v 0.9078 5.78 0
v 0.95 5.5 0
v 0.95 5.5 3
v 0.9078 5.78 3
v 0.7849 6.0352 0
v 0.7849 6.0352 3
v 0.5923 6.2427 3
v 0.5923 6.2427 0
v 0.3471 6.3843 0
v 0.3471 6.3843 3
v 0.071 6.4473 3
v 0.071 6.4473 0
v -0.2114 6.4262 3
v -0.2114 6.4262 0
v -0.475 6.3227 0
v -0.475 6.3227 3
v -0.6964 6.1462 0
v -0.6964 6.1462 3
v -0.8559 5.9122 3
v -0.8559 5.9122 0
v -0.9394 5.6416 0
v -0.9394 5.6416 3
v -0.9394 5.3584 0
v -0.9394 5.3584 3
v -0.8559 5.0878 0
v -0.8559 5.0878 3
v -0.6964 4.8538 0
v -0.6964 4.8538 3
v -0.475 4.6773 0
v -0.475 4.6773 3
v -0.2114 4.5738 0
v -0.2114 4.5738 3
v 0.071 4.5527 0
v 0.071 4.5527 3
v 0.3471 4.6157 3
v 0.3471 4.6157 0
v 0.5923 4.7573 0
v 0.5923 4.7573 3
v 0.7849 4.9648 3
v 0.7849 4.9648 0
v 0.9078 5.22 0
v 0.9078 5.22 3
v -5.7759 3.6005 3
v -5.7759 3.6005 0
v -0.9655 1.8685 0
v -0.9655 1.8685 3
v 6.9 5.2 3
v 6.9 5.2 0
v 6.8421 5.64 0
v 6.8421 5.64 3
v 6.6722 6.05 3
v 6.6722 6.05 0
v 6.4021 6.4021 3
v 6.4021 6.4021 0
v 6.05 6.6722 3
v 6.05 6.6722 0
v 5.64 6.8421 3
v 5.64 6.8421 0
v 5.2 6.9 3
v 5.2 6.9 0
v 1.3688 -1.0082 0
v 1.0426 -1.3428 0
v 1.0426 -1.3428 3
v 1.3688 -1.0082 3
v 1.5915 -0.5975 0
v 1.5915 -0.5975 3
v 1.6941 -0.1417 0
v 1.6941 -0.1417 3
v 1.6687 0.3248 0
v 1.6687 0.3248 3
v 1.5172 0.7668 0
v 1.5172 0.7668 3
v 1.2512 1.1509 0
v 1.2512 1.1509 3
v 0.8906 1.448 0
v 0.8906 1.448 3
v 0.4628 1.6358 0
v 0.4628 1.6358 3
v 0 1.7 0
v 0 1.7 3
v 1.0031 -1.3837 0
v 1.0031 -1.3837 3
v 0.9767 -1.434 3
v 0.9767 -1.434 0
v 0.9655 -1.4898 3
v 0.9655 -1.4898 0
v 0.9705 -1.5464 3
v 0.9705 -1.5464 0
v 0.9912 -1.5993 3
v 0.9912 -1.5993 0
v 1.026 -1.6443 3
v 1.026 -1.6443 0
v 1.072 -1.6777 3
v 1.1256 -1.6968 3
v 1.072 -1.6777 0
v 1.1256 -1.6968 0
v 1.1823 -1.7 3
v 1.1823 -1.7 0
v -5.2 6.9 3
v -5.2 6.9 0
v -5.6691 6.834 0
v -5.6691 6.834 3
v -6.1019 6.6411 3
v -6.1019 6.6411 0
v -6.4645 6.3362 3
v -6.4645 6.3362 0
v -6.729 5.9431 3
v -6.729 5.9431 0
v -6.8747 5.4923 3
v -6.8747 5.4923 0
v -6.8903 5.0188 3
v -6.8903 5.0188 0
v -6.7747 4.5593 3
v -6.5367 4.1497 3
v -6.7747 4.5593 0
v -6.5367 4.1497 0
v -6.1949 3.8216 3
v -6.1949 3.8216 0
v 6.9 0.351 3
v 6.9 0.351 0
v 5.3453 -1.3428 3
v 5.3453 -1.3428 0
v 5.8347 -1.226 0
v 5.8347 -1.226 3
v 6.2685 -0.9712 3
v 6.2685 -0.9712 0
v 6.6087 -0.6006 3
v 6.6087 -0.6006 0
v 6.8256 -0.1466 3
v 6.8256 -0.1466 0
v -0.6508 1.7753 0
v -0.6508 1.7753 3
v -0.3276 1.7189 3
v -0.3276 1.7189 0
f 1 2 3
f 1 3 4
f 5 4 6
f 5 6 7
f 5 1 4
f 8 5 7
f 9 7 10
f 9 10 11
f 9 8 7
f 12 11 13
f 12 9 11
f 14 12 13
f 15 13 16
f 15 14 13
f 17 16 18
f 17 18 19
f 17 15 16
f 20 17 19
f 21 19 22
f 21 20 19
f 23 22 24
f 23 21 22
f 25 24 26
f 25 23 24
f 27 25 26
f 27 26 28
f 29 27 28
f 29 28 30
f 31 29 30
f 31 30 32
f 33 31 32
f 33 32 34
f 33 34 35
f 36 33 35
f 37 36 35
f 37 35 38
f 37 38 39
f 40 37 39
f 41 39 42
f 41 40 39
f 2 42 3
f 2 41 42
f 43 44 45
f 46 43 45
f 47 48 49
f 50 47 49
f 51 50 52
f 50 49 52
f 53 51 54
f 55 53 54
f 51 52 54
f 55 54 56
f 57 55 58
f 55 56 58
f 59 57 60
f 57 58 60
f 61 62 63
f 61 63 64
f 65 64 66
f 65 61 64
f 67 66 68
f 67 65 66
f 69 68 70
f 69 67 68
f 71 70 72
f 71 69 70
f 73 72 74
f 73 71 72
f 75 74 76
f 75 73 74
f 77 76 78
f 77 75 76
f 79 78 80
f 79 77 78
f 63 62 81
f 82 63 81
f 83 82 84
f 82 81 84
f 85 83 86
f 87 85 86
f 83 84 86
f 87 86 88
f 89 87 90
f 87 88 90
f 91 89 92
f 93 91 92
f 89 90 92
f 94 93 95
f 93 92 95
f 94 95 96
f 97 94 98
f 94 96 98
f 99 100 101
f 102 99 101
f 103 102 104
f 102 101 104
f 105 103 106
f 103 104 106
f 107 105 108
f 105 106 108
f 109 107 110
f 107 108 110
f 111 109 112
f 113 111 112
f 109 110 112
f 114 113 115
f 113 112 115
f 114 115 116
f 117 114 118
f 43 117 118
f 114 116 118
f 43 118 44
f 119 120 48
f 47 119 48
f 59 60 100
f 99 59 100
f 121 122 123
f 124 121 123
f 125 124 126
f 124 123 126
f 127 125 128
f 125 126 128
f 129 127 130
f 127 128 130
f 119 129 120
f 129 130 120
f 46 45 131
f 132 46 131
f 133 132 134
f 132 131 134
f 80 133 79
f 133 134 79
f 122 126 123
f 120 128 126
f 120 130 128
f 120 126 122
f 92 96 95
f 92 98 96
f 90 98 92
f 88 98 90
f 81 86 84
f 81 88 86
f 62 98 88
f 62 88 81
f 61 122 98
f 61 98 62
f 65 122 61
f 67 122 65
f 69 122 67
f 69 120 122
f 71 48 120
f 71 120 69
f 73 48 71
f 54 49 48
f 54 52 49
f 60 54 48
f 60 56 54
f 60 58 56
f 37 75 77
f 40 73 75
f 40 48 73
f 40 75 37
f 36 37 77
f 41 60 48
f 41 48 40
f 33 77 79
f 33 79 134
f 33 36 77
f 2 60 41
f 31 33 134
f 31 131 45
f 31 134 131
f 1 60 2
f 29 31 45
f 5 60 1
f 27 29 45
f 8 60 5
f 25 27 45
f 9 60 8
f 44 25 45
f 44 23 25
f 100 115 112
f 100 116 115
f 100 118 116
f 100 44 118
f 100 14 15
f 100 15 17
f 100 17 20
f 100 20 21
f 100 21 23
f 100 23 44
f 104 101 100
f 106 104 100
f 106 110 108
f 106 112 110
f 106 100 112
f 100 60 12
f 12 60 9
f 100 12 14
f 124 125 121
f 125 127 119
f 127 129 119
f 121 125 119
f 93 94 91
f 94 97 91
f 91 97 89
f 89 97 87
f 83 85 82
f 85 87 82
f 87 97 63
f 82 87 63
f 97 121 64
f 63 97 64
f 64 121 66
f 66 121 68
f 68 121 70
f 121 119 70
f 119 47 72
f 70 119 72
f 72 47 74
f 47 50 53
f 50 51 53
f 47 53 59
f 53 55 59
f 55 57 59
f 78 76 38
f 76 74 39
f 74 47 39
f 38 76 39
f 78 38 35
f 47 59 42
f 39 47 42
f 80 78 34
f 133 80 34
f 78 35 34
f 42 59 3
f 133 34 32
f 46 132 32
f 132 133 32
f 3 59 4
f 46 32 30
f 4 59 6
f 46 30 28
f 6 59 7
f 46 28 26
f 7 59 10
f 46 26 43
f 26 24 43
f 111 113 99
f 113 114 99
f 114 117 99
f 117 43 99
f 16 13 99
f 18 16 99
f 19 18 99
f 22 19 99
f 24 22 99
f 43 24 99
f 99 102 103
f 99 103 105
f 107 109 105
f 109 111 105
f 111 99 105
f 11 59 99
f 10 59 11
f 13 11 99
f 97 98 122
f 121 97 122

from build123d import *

# Parameters (mm, degrees)
SKETCH_R  = 0.95
PAD_DEPTH = 3


with BuildPart() as part:
    # Sketch → Pad (new body)
    with BuildSketch(Plane.XY):
        with BuildLine():
            ThreePointArc((1.04259, -1.342761), (1.608212, 0.551048), (0, 1.7))
            ThreePointArc((-0.965474, 1.868515), (-0.490035, 1.742445), (0, 1.7))
            Line((-5.775897, 3.600518), (-0.965474, 1.868515))
            ThreePointArc((-5.2, 6.9), (-6.874682, 5.492302), (-5.775897, 3.600518))
            Line((5.2, 6.9), (-5.2, 6.9))
            ThreePointArc((6.9, 5.2), (6.402082, 6.402082), (5.2, 6.9))
            Line((6.9, 0.351015), (6.9, 5.2))
            ThreePointArc((5.345348, -1.342761), (6.452416, -0.798531), (6.9, 0.351015))
            Line((1.182348, -1.7), (5.345348, -1.342761))
            ThreePointArc((1.04259, -1.342761), (0.978994, -1.573598), (1.182348, -1.7))
        make_face()
        with Locations((0, 5.5)):
            Circle(SKETCH_R, mode=Mode.SUBTRACT)
    extrude(amount=PAD_DEPTH)


solid = part.part
